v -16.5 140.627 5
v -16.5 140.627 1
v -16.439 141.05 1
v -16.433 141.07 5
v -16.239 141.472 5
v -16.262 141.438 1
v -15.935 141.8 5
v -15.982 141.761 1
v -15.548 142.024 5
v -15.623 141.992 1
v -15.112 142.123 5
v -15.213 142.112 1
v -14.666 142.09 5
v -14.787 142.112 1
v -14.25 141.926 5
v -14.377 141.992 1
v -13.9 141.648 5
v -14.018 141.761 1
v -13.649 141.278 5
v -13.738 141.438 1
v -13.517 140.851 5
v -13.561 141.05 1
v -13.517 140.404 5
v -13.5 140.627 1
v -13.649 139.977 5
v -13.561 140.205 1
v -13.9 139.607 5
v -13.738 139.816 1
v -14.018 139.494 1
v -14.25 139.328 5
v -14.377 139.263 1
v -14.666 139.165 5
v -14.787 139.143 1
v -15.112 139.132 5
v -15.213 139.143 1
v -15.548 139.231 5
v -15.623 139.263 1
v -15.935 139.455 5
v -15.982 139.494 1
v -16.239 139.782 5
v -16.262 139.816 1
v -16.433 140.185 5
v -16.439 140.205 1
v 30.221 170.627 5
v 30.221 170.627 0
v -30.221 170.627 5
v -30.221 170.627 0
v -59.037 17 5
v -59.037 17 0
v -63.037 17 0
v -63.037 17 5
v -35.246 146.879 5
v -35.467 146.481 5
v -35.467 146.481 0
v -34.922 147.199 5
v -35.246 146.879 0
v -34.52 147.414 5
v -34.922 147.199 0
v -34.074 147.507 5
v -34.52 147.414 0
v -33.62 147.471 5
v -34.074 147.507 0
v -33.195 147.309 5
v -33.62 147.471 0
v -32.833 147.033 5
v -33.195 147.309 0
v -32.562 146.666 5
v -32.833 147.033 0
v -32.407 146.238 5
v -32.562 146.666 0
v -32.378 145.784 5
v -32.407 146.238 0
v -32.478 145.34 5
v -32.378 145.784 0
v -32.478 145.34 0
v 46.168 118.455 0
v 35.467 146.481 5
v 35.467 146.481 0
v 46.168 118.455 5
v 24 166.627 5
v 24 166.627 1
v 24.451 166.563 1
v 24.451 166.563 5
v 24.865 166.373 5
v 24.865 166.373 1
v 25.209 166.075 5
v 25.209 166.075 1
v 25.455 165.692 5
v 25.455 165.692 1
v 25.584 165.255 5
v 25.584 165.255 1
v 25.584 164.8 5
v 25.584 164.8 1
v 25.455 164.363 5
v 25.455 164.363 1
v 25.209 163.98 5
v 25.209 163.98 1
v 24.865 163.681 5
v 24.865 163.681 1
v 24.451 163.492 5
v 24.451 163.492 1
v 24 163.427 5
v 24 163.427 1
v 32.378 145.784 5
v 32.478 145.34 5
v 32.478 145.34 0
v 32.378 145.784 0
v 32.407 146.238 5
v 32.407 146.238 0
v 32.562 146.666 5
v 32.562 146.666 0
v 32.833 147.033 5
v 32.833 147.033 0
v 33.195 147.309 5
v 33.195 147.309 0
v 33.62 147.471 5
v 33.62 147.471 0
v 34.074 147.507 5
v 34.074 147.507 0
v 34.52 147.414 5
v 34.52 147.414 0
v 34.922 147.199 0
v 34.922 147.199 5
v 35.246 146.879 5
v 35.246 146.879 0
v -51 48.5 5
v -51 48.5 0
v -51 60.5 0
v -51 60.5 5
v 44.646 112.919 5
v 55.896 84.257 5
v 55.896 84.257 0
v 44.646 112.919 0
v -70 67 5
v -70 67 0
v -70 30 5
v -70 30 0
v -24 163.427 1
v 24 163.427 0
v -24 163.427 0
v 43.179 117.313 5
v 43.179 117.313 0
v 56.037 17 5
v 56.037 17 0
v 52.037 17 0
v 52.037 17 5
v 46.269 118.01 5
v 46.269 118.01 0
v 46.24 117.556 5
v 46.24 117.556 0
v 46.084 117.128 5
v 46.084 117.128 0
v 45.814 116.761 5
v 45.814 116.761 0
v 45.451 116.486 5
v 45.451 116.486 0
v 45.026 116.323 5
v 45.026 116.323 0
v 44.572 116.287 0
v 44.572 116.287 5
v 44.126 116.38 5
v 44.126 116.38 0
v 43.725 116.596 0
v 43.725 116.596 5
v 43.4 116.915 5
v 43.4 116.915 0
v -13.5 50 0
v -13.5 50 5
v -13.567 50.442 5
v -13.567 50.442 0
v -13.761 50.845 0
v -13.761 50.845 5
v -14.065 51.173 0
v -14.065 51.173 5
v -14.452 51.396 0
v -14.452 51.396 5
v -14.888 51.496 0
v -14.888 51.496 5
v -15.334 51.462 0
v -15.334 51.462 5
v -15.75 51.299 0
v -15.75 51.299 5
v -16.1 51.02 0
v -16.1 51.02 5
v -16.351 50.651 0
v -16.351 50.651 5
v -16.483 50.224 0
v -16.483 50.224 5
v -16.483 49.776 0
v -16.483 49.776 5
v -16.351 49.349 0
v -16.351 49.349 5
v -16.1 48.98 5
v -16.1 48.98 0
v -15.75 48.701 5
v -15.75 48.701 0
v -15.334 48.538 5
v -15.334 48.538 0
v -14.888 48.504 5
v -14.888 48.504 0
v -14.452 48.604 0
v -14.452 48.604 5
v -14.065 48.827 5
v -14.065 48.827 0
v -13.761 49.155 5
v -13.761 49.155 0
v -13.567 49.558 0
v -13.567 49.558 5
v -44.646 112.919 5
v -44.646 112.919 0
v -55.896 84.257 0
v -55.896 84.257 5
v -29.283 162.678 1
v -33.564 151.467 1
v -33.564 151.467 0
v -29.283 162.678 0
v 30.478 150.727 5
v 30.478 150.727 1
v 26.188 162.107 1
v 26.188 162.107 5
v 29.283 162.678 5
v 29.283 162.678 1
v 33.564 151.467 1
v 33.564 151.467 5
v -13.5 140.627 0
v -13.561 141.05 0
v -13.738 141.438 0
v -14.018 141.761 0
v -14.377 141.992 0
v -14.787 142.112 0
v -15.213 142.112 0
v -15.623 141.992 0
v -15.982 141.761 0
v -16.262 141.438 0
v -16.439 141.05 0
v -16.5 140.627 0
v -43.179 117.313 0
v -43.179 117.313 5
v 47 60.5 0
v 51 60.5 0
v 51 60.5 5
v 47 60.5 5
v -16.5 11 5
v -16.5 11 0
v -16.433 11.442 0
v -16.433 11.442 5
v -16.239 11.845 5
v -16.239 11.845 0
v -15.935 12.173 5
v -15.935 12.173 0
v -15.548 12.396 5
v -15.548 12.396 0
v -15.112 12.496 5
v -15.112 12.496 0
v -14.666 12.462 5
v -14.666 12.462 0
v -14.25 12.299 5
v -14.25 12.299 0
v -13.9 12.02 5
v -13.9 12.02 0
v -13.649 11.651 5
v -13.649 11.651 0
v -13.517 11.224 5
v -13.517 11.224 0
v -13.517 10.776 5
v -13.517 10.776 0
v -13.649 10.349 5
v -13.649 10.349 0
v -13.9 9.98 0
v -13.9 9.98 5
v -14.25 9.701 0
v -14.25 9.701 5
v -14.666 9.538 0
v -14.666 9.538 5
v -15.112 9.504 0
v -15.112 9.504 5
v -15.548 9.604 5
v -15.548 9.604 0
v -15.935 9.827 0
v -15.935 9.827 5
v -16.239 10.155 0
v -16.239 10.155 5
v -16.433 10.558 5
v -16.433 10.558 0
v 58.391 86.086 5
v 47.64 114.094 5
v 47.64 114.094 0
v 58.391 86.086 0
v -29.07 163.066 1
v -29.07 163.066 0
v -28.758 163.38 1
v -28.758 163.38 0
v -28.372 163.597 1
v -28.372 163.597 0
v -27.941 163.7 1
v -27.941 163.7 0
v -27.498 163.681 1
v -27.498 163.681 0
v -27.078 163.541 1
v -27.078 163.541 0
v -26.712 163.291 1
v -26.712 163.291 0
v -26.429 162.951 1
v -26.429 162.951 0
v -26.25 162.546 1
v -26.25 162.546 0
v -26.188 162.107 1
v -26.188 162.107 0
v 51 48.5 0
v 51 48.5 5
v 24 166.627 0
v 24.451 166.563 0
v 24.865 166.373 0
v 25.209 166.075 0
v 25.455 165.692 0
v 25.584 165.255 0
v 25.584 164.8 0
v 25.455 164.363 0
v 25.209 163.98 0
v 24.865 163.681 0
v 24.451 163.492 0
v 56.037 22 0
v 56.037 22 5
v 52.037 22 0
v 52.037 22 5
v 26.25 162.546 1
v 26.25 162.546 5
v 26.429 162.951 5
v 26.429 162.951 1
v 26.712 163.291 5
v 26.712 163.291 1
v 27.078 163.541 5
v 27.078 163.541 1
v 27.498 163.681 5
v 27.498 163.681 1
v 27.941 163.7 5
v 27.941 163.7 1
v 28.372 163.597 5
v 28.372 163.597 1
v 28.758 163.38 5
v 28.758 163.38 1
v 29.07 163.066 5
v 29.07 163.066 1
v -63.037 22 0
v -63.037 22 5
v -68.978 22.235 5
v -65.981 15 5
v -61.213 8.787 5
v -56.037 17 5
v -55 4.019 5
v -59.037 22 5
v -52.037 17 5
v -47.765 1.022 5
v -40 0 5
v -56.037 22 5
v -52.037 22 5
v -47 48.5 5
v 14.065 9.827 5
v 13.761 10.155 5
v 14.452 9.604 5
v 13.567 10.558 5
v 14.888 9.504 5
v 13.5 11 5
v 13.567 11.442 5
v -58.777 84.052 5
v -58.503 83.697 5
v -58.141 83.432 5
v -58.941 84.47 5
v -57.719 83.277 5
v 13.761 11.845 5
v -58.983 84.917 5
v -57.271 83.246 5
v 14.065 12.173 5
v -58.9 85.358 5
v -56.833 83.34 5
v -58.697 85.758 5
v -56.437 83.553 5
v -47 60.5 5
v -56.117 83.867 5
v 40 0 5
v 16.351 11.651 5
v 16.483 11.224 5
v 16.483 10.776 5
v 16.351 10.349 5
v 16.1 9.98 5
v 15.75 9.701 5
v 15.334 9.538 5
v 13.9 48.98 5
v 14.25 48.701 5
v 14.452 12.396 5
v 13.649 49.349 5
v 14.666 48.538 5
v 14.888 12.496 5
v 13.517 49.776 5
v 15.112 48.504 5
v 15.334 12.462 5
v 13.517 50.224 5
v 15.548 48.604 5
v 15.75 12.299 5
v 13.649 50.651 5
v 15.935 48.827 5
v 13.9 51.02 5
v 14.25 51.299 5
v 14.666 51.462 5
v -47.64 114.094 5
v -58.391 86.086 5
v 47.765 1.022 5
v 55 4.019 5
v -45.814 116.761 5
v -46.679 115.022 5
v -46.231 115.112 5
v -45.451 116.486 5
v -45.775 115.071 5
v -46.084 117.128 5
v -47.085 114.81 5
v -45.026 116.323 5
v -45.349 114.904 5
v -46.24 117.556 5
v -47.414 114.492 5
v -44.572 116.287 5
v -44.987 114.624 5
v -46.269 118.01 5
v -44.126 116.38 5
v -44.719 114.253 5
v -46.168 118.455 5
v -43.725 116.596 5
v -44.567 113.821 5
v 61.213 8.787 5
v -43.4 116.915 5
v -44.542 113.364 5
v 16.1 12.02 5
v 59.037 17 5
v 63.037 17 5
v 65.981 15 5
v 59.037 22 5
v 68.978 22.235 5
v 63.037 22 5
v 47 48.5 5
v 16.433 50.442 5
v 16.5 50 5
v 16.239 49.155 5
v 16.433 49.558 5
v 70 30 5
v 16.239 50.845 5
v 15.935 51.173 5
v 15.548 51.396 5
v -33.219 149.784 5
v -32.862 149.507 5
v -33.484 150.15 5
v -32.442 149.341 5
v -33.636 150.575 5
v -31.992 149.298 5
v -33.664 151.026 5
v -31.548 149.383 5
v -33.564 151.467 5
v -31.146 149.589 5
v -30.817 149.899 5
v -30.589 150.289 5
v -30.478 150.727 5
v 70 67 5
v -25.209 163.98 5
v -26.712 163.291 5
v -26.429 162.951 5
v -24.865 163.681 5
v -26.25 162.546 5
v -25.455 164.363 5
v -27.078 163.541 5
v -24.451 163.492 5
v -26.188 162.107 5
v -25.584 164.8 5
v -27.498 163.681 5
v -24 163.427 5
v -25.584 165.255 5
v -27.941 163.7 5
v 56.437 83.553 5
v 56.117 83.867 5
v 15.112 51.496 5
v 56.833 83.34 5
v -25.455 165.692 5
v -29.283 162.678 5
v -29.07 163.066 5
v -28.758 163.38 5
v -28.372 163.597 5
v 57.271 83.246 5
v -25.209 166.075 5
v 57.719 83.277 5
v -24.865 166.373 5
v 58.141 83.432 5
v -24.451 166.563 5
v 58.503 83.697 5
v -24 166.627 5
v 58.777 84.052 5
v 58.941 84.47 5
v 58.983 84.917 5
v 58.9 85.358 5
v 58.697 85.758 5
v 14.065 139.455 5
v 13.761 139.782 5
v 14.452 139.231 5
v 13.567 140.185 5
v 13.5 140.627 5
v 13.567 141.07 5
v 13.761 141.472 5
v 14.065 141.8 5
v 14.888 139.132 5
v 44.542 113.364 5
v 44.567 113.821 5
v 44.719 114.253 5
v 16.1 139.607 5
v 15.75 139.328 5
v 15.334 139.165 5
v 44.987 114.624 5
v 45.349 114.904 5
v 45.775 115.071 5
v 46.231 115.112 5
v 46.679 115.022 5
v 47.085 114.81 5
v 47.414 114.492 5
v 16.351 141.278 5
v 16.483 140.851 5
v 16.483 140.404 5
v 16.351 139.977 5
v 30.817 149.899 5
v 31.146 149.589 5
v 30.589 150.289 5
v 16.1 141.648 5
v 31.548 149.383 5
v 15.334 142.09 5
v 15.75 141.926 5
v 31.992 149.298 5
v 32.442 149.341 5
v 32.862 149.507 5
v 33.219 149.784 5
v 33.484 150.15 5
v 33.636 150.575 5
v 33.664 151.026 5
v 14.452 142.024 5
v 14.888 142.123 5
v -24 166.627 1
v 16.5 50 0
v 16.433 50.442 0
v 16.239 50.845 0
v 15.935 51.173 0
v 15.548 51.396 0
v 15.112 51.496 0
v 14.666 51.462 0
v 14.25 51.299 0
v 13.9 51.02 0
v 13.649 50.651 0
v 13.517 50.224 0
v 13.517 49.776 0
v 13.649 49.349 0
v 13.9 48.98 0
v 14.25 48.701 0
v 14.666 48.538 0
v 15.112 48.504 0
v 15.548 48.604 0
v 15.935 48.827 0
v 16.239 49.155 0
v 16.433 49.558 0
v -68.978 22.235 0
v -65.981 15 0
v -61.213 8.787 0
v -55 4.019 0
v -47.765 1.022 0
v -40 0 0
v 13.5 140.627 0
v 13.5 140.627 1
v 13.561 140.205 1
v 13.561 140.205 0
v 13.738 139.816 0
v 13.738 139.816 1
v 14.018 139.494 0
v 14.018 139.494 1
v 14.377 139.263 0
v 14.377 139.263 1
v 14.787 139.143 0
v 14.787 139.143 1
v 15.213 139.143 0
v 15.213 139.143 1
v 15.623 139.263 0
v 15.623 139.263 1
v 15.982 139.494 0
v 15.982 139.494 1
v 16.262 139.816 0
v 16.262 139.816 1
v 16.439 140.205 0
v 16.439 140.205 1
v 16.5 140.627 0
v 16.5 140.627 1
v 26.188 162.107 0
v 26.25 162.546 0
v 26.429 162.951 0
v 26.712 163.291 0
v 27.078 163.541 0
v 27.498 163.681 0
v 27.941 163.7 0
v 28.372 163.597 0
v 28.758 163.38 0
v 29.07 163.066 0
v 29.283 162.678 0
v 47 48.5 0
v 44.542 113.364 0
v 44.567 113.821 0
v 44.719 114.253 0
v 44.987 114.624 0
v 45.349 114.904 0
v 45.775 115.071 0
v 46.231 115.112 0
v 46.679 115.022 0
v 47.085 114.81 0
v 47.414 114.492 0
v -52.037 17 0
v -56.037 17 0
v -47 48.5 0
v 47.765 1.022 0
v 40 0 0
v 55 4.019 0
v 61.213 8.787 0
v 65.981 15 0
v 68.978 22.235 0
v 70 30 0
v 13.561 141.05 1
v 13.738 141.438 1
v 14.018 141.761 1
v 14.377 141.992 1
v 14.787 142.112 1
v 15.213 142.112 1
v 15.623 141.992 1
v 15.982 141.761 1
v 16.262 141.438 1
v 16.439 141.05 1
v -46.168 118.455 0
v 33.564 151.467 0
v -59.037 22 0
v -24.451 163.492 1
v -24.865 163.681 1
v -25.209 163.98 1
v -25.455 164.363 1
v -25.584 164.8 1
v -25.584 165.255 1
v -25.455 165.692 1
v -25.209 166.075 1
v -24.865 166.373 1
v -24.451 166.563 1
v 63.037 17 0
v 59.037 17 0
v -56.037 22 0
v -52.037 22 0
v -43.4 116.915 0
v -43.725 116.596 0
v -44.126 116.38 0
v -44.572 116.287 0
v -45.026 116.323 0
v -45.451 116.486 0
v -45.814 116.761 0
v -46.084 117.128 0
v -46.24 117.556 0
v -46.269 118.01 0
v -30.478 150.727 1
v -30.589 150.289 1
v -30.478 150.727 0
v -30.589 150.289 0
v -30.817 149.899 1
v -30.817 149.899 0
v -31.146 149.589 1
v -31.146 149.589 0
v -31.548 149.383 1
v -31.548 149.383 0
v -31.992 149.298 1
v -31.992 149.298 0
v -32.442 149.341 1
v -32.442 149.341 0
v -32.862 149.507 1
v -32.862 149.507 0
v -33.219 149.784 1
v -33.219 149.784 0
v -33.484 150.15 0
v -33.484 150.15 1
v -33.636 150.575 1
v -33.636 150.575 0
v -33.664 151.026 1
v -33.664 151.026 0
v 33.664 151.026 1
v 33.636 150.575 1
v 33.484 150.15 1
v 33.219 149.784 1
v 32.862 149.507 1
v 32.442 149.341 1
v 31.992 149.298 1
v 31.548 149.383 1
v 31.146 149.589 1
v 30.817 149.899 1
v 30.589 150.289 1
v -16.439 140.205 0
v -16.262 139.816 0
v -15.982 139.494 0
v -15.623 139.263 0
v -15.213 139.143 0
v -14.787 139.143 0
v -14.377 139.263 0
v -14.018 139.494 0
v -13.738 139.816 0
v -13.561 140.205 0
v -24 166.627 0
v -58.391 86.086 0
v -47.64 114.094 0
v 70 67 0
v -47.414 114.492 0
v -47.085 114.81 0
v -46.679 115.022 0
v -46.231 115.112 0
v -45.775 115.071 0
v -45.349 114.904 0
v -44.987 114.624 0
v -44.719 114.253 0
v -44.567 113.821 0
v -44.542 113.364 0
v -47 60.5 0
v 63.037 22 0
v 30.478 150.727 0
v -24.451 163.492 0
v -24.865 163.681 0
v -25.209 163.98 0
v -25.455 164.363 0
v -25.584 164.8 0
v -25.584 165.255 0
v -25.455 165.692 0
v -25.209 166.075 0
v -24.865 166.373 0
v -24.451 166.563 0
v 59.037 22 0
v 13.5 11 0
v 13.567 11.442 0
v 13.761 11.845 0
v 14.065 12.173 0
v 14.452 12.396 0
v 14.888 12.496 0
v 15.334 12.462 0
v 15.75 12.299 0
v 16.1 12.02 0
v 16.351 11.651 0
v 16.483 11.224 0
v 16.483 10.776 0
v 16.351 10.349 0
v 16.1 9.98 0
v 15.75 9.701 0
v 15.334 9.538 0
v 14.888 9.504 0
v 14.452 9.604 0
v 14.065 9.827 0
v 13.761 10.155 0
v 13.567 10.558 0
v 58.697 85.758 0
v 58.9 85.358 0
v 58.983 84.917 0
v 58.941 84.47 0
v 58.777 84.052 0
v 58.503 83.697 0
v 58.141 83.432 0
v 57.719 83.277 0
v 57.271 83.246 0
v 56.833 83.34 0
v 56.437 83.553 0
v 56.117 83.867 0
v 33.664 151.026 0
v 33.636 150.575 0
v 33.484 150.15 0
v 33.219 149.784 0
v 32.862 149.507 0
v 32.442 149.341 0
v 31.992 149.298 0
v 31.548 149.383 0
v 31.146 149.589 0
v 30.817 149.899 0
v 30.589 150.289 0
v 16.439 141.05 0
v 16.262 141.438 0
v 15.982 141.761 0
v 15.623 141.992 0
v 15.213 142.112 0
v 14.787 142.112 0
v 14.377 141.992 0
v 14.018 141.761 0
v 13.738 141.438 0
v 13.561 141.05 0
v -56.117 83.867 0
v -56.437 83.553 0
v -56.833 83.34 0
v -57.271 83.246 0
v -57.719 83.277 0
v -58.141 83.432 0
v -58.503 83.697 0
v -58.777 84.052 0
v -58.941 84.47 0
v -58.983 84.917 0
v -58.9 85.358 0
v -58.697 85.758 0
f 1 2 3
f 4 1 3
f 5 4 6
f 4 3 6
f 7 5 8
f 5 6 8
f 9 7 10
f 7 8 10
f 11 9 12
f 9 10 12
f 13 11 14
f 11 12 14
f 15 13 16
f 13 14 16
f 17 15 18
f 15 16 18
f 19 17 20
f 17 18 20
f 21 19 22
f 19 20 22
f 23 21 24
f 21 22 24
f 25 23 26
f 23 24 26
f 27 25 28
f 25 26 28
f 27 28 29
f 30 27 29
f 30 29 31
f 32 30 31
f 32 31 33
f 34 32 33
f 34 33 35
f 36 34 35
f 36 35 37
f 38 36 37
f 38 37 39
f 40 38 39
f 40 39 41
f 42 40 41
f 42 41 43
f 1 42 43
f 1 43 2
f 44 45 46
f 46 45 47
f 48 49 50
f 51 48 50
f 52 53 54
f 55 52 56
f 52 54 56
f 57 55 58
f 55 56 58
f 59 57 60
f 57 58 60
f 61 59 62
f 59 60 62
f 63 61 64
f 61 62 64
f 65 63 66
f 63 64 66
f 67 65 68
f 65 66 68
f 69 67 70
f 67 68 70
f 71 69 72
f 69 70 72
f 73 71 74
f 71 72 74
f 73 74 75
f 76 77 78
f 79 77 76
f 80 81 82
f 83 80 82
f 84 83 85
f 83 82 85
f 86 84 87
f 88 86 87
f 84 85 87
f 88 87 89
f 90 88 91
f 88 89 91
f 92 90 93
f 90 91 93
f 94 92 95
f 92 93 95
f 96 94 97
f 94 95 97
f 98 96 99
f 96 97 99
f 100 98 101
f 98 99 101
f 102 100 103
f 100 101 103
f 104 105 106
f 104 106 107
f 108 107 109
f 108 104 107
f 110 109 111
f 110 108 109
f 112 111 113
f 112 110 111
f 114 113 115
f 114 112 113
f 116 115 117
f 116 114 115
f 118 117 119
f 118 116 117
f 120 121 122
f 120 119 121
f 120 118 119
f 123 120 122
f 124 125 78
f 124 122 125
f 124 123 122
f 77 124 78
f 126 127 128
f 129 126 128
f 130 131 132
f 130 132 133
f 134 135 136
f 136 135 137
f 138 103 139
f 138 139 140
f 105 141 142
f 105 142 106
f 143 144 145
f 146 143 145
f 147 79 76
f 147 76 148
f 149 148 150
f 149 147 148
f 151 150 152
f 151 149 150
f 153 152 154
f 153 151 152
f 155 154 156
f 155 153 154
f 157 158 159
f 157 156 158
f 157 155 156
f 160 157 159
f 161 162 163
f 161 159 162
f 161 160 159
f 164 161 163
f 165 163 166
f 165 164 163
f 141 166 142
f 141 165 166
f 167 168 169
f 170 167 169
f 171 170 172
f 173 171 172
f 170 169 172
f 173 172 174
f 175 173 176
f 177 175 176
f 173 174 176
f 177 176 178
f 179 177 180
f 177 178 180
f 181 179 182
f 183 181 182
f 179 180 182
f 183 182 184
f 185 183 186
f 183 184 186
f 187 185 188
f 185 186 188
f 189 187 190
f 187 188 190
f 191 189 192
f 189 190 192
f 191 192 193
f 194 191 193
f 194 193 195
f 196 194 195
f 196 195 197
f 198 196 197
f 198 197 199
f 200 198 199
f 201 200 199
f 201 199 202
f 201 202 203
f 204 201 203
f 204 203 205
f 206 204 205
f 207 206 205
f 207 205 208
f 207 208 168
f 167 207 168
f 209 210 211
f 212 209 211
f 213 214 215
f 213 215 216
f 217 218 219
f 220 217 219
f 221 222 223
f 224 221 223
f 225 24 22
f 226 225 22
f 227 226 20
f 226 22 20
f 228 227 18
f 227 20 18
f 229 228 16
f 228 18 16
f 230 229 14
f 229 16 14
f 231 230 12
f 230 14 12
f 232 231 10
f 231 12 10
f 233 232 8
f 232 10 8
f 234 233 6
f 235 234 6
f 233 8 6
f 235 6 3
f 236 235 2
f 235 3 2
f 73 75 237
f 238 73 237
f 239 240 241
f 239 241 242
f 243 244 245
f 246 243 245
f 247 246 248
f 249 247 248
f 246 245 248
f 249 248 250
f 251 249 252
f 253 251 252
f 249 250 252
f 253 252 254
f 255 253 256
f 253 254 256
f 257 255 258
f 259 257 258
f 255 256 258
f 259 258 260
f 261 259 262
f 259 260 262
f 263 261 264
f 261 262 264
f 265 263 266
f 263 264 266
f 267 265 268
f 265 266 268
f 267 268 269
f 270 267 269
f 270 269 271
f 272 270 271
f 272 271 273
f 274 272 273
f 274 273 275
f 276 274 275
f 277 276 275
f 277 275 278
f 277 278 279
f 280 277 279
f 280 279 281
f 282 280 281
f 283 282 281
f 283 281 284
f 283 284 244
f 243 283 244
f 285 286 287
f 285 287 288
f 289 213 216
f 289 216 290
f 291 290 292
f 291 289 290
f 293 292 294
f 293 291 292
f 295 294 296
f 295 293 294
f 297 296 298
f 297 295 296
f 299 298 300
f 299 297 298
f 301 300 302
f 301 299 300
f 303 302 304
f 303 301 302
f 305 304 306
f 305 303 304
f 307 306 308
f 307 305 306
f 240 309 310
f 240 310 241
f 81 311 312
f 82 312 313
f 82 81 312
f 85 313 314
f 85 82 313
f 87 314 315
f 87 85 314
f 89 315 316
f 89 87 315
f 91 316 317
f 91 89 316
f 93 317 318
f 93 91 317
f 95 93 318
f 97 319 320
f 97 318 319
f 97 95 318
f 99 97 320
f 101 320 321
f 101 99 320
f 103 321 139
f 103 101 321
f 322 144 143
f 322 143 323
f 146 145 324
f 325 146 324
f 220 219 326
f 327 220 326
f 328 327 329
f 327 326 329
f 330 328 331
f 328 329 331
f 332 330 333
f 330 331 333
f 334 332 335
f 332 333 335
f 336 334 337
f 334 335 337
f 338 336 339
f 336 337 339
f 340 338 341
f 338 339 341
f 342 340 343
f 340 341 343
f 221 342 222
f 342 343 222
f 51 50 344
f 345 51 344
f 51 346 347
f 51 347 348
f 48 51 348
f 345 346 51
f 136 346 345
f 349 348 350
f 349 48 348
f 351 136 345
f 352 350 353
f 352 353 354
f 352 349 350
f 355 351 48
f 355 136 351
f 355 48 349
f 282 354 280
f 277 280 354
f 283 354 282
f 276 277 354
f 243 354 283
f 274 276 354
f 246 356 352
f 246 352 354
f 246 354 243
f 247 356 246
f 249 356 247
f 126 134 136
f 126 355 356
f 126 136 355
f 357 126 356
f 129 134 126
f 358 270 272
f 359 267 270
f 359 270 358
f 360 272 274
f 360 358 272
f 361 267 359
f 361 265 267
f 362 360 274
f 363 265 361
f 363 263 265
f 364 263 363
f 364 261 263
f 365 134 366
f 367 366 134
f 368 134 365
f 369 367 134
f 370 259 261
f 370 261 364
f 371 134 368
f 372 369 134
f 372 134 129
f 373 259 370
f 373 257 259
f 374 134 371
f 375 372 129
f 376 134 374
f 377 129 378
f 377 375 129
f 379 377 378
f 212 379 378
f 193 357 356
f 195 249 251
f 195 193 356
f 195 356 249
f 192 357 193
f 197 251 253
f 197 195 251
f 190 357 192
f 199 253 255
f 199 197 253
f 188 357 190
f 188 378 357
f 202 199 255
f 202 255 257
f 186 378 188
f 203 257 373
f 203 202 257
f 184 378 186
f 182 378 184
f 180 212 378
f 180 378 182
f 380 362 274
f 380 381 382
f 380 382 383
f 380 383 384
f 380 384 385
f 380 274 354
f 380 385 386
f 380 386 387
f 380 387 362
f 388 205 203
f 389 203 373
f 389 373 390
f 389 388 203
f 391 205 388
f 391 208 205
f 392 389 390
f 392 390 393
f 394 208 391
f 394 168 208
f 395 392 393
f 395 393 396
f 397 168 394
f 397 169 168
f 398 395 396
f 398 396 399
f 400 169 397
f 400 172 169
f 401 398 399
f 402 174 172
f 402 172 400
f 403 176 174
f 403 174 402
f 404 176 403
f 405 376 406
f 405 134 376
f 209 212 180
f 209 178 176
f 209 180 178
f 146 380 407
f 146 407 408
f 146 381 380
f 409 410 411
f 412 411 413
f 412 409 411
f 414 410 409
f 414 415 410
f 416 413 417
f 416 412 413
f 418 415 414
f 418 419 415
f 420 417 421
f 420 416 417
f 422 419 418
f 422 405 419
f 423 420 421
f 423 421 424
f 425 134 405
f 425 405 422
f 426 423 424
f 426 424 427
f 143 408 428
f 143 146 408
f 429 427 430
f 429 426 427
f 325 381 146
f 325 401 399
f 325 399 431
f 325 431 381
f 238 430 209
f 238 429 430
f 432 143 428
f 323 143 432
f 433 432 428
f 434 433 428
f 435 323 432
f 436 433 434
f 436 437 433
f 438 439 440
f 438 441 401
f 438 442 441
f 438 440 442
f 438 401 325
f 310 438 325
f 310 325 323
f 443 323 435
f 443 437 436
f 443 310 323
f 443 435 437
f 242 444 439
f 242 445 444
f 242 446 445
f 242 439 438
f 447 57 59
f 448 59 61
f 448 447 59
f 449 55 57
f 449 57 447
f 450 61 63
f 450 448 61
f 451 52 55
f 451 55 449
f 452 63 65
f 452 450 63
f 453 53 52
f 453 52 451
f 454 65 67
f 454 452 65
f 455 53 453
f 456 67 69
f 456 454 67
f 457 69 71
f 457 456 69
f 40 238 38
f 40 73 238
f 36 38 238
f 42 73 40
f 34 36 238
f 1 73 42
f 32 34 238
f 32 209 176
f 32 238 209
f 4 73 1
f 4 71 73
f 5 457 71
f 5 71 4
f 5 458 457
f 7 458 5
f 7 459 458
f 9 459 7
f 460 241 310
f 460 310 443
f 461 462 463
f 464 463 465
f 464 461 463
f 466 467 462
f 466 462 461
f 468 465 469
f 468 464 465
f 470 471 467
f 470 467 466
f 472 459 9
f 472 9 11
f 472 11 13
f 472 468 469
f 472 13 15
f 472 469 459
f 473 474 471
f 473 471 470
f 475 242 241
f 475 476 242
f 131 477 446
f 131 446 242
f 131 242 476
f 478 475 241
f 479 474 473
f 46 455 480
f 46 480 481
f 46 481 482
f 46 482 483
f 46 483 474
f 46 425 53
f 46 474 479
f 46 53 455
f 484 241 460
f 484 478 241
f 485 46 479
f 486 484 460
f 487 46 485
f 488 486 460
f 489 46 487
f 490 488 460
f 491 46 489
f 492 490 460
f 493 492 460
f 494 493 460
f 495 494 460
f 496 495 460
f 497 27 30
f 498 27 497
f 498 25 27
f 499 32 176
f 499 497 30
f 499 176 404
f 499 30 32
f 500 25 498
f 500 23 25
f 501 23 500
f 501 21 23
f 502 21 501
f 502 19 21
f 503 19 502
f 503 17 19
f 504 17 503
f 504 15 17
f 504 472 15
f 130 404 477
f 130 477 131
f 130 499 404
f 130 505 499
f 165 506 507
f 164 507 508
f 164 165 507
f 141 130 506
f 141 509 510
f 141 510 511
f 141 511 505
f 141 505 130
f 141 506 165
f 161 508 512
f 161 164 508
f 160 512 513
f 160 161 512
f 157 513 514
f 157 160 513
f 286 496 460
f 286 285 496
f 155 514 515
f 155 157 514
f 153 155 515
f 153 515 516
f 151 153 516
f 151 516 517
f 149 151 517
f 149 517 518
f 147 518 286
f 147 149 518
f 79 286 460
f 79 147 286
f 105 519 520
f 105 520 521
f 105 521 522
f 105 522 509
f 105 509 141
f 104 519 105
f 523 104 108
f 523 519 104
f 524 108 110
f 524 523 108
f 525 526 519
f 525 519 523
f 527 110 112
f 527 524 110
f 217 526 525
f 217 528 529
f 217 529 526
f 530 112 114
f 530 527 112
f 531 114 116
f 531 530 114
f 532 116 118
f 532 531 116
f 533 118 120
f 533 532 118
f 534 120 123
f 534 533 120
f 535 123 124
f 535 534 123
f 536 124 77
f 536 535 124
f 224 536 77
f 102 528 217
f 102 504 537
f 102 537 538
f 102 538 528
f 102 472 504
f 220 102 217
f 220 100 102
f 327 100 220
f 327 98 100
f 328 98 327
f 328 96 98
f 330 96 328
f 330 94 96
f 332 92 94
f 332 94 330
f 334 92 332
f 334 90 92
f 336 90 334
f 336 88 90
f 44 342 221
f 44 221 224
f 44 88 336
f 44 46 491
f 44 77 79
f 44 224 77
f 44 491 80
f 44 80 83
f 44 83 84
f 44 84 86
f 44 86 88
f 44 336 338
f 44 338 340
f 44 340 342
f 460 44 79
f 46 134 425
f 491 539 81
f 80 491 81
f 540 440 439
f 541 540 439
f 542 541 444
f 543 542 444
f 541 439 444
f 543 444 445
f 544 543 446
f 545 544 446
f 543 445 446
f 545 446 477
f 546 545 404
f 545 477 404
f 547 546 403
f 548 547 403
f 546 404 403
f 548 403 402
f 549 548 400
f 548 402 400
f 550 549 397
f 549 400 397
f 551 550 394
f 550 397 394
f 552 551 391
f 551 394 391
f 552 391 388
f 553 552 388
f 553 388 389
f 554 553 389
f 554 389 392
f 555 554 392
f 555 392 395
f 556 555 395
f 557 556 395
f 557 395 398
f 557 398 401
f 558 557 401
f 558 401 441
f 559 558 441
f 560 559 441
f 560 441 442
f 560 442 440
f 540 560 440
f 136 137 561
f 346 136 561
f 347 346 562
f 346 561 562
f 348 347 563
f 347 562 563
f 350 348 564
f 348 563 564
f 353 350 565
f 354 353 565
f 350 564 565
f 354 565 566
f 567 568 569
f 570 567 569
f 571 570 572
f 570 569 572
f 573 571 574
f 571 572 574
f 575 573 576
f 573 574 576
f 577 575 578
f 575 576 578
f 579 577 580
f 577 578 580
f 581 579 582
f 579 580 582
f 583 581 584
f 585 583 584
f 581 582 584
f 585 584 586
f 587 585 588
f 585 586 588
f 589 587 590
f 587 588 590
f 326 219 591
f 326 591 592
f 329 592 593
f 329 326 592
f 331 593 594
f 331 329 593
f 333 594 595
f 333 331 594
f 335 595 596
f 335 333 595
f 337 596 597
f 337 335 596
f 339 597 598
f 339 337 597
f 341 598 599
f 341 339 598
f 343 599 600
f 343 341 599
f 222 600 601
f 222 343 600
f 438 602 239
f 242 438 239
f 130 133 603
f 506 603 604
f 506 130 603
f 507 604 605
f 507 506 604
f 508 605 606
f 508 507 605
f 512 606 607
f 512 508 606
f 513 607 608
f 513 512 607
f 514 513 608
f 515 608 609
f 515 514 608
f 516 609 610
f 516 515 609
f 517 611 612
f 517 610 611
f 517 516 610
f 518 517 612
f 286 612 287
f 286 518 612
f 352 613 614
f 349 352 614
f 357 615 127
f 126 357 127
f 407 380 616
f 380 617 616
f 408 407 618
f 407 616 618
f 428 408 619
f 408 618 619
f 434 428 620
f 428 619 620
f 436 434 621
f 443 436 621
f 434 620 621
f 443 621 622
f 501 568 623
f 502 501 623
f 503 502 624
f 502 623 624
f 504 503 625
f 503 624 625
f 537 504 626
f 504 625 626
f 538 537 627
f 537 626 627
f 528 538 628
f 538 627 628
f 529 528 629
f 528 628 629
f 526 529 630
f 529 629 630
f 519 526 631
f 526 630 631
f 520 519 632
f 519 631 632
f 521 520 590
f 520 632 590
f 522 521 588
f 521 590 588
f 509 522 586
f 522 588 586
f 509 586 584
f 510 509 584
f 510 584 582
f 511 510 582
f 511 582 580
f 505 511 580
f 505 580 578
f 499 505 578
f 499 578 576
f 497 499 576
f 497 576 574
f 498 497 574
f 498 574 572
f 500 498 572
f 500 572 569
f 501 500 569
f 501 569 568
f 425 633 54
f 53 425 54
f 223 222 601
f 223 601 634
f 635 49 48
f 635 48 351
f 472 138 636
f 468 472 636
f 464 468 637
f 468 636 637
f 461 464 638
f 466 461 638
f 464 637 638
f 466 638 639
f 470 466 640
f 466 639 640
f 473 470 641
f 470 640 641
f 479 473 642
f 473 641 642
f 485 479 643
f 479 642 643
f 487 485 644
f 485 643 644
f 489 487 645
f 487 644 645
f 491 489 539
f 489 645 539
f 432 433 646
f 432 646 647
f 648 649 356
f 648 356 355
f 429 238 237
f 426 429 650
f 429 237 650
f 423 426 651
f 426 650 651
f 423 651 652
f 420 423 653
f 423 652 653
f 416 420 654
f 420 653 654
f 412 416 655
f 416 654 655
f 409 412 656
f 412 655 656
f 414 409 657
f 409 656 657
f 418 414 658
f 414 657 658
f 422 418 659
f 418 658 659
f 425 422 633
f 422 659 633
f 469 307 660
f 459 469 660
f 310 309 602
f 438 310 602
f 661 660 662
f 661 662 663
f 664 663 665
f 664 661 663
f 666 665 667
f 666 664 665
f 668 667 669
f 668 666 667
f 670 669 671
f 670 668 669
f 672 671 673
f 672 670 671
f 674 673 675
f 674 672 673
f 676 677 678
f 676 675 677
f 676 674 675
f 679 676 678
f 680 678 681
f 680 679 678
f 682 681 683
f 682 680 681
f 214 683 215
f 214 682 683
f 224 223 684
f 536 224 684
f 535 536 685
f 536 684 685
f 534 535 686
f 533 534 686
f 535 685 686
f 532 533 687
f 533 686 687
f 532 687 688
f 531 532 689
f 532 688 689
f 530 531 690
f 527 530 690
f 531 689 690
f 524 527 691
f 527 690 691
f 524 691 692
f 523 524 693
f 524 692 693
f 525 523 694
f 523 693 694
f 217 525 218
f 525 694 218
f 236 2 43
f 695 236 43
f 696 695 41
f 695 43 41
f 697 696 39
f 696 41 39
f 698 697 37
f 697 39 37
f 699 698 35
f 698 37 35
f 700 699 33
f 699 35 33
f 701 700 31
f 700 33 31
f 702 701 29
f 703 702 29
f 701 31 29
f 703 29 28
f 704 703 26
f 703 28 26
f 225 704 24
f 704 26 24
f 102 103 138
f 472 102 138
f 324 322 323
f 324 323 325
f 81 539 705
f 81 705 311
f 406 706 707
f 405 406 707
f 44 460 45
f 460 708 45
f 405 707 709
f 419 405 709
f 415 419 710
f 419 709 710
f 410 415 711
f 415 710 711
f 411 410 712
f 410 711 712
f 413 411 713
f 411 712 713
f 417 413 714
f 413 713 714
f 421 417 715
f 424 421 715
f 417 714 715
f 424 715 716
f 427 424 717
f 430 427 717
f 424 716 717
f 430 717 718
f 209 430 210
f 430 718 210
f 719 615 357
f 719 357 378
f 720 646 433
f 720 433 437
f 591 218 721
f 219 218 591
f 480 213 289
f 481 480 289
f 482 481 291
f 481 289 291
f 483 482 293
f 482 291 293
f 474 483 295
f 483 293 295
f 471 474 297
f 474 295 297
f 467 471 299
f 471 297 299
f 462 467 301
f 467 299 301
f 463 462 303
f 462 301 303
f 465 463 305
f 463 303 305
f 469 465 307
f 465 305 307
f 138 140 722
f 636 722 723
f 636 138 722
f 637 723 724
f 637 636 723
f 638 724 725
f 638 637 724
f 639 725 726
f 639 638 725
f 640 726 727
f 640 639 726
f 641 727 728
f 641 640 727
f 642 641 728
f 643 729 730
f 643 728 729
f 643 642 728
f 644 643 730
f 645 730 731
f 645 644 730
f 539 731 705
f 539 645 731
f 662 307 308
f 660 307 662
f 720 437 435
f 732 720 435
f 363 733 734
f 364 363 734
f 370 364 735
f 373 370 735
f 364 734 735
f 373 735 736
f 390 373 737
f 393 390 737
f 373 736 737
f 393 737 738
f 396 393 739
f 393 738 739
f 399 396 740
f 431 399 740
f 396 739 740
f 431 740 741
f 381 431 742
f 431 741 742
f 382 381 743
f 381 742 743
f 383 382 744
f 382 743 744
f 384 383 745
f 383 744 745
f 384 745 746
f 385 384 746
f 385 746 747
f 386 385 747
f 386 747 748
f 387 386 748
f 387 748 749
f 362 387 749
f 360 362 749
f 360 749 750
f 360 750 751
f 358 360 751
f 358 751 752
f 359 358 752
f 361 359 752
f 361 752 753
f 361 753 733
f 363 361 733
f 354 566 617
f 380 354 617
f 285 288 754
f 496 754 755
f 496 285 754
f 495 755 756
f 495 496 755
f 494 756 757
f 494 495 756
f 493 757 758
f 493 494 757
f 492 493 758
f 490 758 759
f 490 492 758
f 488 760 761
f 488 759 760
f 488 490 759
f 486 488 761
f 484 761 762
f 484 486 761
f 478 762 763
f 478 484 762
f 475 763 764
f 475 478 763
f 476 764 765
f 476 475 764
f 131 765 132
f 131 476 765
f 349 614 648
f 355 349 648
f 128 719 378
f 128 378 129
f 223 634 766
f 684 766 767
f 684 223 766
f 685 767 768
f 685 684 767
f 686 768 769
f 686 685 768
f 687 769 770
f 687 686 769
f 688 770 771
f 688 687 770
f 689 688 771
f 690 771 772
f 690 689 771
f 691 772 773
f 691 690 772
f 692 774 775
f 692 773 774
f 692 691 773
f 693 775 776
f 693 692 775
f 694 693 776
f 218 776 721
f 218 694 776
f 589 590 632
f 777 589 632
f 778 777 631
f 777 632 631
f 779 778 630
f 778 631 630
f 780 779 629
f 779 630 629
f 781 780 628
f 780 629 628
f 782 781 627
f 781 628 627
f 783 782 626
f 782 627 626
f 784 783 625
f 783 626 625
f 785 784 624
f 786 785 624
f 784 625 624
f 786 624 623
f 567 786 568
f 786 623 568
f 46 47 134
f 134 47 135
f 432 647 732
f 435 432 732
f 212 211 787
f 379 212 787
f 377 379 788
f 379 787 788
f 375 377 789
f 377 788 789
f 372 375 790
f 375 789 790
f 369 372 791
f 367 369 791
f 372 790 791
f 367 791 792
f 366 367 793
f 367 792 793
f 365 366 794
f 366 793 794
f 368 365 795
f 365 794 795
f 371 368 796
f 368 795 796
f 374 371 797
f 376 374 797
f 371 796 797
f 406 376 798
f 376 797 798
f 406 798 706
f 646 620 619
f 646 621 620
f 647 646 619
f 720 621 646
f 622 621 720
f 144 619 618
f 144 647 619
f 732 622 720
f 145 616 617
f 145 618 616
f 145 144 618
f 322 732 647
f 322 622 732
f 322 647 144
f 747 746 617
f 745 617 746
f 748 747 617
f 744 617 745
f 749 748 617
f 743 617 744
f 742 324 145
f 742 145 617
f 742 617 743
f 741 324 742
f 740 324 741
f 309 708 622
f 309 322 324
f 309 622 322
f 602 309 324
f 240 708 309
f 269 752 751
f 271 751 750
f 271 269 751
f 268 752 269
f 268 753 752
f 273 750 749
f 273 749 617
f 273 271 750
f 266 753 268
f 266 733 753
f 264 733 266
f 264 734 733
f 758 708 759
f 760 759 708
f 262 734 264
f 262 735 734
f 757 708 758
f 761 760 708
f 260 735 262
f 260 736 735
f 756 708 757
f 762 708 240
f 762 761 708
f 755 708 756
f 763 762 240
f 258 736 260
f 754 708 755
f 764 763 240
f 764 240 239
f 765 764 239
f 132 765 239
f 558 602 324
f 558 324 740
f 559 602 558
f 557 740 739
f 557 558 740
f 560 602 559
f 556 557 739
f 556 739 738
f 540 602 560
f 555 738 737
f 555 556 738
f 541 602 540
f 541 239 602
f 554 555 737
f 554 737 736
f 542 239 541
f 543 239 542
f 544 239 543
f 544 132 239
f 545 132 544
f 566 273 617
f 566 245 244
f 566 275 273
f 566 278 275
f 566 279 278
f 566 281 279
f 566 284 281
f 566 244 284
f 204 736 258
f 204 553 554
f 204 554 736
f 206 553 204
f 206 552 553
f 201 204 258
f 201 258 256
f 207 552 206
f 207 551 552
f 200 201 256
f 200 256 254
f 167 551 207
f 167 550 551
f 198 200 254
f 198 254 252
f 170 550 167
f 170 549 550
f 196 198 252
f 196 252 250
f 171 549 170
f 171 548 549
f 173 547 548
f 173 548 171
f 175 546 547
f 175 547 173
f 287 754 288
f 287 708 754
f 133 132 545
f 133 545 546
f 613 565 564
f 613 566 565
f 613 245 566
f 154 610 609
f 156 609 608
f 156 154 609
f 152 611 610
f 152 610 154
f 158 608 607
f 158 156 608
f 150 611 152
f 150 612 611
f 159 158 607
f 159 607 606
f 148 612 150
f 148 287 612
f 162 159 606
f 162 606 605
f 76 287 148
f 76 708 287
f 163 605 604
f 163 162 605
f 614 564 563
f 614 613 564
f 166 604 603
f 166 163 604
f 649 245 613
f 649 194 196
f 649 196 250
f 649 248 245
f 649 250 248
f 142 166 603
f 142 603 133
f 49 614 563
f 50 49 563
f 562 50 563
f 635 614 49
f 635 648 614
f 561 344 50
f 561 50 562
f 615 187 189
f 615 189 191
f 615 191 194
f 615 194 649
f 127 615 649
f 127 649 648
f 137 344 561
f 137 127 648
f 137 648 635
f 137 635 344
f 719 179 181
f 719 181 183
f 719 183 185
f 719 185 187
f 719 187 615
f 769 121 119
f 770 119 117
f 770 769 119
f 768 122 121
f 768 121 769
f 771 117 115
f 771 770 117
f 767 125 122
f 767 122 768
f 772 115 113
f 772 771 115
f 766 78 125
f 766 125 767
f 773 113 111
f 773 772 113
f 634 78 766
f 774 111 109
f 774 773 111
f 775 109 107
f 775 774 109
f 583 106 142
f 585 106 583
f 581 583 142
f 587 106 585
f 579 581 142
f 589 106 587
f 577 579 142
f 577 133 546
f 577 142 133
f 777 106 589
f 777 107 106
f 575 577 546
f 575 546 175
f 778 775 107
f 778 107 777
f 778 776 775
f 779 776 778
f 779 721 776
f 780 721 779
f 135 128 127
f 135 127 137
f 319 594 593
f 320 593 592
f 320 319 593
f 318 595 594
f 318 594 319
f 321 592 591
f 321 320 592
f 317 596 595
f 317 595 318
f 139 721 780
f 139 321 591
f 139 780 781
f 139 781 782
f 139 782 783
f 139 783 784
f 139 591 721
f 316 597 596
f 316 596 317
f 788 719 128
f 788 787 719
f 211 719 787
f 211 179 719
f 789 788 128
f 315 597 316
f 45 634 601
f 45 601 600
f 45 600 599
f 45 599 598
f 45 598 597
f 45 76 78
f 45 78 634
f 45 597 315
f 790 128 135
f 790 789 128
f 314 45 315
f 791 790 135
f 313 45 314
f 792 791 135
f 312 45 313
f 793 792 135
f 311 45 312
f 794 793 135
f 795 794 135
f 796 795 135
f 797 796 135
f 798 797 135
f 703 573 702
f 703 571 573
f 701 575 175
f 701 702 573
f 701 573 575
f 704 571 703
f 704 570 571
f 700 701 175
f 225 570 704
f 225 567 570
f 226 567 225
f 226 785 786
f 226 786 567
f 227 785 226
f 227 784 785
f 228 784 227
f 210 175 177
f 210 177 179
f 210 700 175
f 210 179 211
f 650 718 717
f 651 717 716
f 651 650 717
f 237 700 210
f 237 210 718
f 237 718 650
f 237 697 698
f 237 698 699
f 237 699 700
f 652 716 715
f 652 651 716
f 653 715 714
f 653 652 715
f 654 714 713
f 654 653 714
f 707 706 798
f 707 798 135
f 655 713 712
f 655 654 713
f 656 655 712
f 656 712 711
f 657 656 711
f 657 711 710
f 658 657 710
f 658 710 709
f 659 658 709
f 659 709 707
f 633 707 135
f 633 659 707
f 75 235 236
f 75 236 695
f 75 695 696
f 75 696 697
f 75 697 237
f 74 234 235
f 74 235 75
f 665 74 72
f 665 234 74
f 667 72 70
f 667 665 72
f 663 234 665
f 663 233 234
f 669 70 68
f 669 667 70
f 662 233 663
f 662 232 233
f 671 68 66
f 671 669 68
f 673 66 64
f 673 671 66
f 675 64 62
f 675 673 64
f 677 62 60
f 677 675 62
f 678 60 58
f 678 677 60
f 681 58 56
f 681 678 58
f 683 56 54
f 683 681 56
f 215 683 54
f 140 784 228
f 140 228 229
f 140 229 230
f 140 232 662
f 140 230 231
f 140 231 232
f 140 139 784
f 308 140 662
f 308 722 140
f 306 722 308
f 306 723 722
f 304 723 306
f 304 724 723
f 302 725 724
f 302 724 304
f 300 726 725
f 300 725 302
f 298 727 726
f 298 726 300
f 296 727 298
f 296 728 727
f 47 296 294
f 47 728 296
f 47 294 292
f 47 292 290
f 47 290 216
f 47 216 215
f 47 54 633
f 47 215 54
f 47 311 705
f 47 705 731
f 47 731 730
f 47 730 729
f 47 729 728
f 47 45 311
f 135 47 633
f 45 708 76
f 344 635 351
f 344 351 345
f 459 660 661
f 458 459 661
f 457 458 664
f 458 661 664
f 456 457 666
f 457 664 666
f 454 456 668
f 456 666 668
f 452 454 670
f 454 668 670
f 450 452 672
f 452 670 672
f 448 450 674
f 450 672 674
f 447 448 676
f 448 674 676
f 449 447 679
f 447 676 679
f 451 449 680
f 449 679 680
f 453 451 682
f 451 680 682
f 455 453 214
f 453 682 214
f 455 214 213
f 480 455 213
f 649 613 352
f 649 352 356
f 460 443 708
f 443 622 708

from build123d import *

# Parameters (mm, degrees)
BOSS_EXTRUDE2_DEPTH  = 1
SKETCH41_W           = 4
SKETCH41_H           = 5
SKETCH41_R           = 1.5
SKETCH41_H_2         = 12
CUT_EXTRUDE42_DEPTH  = 19
BOSS_EXTRUDE17_DEPTH = 4
SKETCH47_W           = 4
SKETCH47_H           = 5
SKETCH47_H_2         = 12
CUT_EXTRUDE47_DEPTH  = 185.495850796
SKETCH48_R           = 1.5
CUT_EXTRUDE44_DEPTH  = 185.495850796
BOSS_EXTRUDE18_START = -1
SKETCH51_R           = 1.5
BOSS_EXTRUDE18_DEPTH = 1
BOSS_EXTRUDE19_START = -2
SKETCH52_R           = 1.5
BOSS_EXTRUDE19_DEPTH = 2
SKETCH53_R           = 1.5
CUT_EXTRUDE46_DEPTH  = 185.495850796
BOSS_EXTRUDE20_START = -1
SKETCH55_R           = 1.5
BOSS_EXTRUDE20_DEPTH = 1
SKETCH58_R           = 1.5
CUT_EXTRUDE45_DEPTH  = 185.495850796


with BuildPart() as part:
    # Sketch2 → Boss-Extrude2 (new body)
    with BuildSketch(Plane.XY):
        with BuildLine():
            Line((0, 0), (40, 0))
            ThreePointArc((40, 0), (61.213203436, 8.786796564), (70, 30))
            Line((70, 30), (70, 67))
            Line((70, 67), (30.2211576, 170.627427341))
            Line((30.2211576, 170.627427341), (-30.2211576, 170.627427341))
            Line((-30.2211576, 170.627427341), (-70, 67))
            Line((-70, 67), (-70, 30))
            ThreePointArc((-70, 30), (-61.213203436, 8.786796564), (-40, 0))
            Line((-40, 0), (0, 0))
        make_face()
    extrude(amount=BOSS_EXTRUDE2_DEPTH)

    # Sketch41 → Cut-Extrude42 (cut)
    with BuildSketch(Plane.XY.offset(1)):
        with Locations((54.037011669, 19.5)):
            Rectangle(SKETCH41_W, SKETCH41_H)
        with Locations((-54.037011669, 19.5)):
            Rectangle(SKETCH41_W, SKETCH41_H)
        with Locations((-15, 65)):
            Circle(SKETCH41_R)
        with Locations((15, 65)):
            Circle(SKETCH41_R)
        with BuildLine():
            ThreePointArc((-55.895620015, 84.257333662), (-58.330916289, 83.551440528), (-58.390755847, 86.086272335))
            Line((-58.390755847, 86.086272335), (-47.63971736, 114.09368513))
            ThreePointArc((-47.63971736, 114.09368513), (-45.555710052, 115.00290606), (-44.646489123, 112.918898752))
            Line((-44.646489123, 112.918898752), (-55.895620015, 84.257333662))
        make_face()
        with BuildLine():
            ThreePointArc((-43.178836535, 117.313137537), (-45.24430647, 116.38910618), (-46.168337826, 118.454576116))
            Line((-46.168337826, 118.454576116), (-35.46735115, 146.481150722))
            ThreePointArc((-35.46735115, 146.481150722), (-33.401881215, 147.405182078), (-32.477849859, 145.339712143))
            Line((-32.477849859, 145.339712143), (-43.178836535, 117.313137537))
        make_face()
        with BuildLine():
            ThreePointArc((24, 166.627427341), (25.6, 165.027427341), (24, 163.427427341))
            Line((24, 163.427427341), (-24, 163.427427341))
            ThreePointArc((-24, 163.427427341), (-25.6, 165.027427341), (-24, 166.627427341))
            Line((-24, 166.627427341), (24, 166.627427341))
        make_face()
        with BuildLine():
            ThreePointArc((33.563613753, 151.467161805), (32.441986519, 149.340557263), (30.477844504, 150.727150454))
            Line((30.477844504, 150.727150454), (26.188468437, 162.107072358))
            ThreePointArc((26.188468437, 162.107072358), (27.498296965, 163.680540031), (29.283219083, 162.677791648))
            Line((29.283219083, 162.677791648), (33.563613753, 151.467161805))
        make_face()
        with BuildLine():
            Line((55.895620015, 84.257333662), (44.646489123, 112.918898752))
            ThreePointArc((44.646489123, 112.918898752), (45.555710052, 115.00290606), (47.63971736, 114.09368513))
            Line((47.63971736, 114.09368513), (58.390755847, 86.086272335))
            ThreePointArc((58.390755847, 86.086272335), (58.330916289, 83.551440528), (55.895620015, 84.257333662))
        make_face()
        with Locations((-15, 140.627427341)):
            Circle(SKETCH41_R)
        with Locations((15, 140.627427341)):
            Circle(SKETCH41_R)
        with Locations((49, 54.5)):
            Rectangle(SKETCH41_W, SKETCH41_H_2)
        with Locations((-49, 54.5)):
            Rectangle(SKETCH41_W, SKETCH41_H_2)
        with Locations((61.037011669, 19.5)):
            Rectangle(SKETCH41_W, SKETCH41_H)
        with Locations(Location((15, 15, 0), (0, 0, 180))):
            Circle(SKETCH41_R)
        with Locations((-15, 15)):
            Circle(SKETCH41_R)
        with Locations((-61.037011669, 19.5)):
            Rectangle(SKETCH41_W, SKETCH41_H)
        with BuildLine():
            Line((-33.563613753, 151.467161805), (-29.283219083, 162.677791648))
            ThreePointArc((-29.283219083, 162.677791648), (-27.498296965, 163.680540031), (-26.188468437, 162.107072358))
            Line((-26.188468437, 162.107072358), (-30.477844504, 150.727150454))
            ThreePointArc((-30.477844504, 150.727150454), (-32.441986519, 149.340557263), (-33.563613753, 151.467161805))
        make_face()
        with BuildLine():
            Line((35.46735115, 146.481150722), (46.168337826, 118.454576116))
            ThreePointArc((46.168337826, 118.454576116), (45.24430647, 116.38910618), (43.178836535, 117.313137537))
            Line((43.178836535, 117.313137537), (32.477849859, 145.339712143))
            ThreePointArc((32.477849859, 145.339712143), (33.401881215, 147.405182078), (35.46735115, 146.481150722))
        make_face()
    extrude(amount=-CUT_EXTRUDE42_DEPTH, mode=Mode.SUBTRACT)

    # Sketch42 → Boss-Extrude17 (add)
    with BuildSketch(Plane.XY.offset(1)):
        with BuildLine():
            Line((-40, 0), (40, 0))
            ThreePointArc((40, 0), (61.213203436, 8.786796564), (70, 30))
            Line((70, 30), (70, 67))
            Line((70, 67), (30.2211576, 170.627427341))
            Line((30.2211576, 170.627427341), (-30.2211576, 170.627427341))
            Line((-30.2211576, 170.627427341), (-70, 67))
            Line((-70, 67), (-70, 30))
            ThreePointArc((-70, 30), (-61.213203436, 8.786796564), (-40, 0))
        make_face()
    extrude(amount=BOSS_EXTRUDE17_DEPTH)

    # Sketch47 → Cut-Extrude47 (cut, through all)
    with BuildSketch(Plane(origin=(0, 0, 0), x_dir=(-1, 0, 0), z_dir=(0, 0, -1))):
        with Locations((61.037011669, 19.5)):
            Rectangle(SKETCH47_W, SKETCH47_H)
        with Locations((54.037011669, 19.5)):
            Rectangle(SKETCH47_W, SKETCH47_H)
        with Locations((-54.037011669, 19.5)):
            Rectangle(SKETCH47_W, SKETCH47_H)
        with Locations((-61.037011669, 19.5)):
            Rectangle(SKETCH47_W, SKETCH47_H)
        with Locations((-49, 54.5)):
            Rectangle(SKETCH47_W, SKETCH47_H_2)
        with Locations((49, 54.5)):
            Rectangle(SKETCH47_W, SKETCH47_H_2)
    extrude(amount=-CUT_EXTRUDE47_DEPTH, mode=Mode.SUBTRACT)

    # Sketch48 → Cut-Extrude44 (cut, through all)
    with BuildSketch(Plane(origin=(0, 0, 0), x_dir=(-1, 0, 0), z_dir=(0, 0, -1))):
        with Locations((-15, 140.627427341)):
            Circle(SKETCH48_R)
        with Locations((15, 140.627427341)):
            Circle(SKETCH48_R)
        with BuildLine():
            Line((-43.178836535, 117.313137537), (-32.477849859, 145.339712143))
            ThreePointArc((-32.477849859, 145.339712143), (-33.401881215, 147.405182078), (-35.46735115, 146.481150722))
            Line((-35.46735115, 146.481150722), (-46.168337826, 118.454576116))
            ThreePointArc((-46.168337826, 118.454576116), (-45.24430647, 116.38910618), (-43.178836535, 117.313137537))
        make_face()
        with BuildLine():
            Line((-55.895620015, 84.257333662), (-44.646489123, 112.918898752))
            ThreePointArc((-44.646489123, 112.918898752), (-45.555710052, 115.00290606), (-47.63971736, 114.09368513))
            Line((-47.63971736, 114.09368513), (-58.390755847, 86.086272335))
            ThreePointArc((-58.390755847, 86.086272335), (-58.330916289, 83.551440528), (-55.895620015, 84.257333662))
        make_face()
        with BuildLine():
            Line((-30.477844504, 150.727150454), (-26.188468437, 162.107072358))
            ThreePointArc((-26.188468437, 162.107072358), (-27.498296965, 163.680540031), (-29.283219083, 162.677791648))
            Line((-29.283219083, 162.677791648), (-33.563613753, 151.467161805))
            ThreePointArc((-33.563613753, 151.467161805), (-32.441986519, 149.340557263), (-30.477844504, 150.727150454))
        make_face()
        with BuildLine():
            Line((-24, 163.427427341), (24, 163.427427341))
            ThreePointArc((24, 163.427427341), (25.6, 165.027427341), (24, 166.627427341))
            Line((24, 166.627427341), (-24, 166.627427341))
            ThreePointArc((-24, 166.627427341), (-25.6, 165.027427341), (-24, 163.427427341))
        make_face()
        with BuildLine():
            Line((26.188468437, 162.107072358), (30.477844504, 150.727150454))
            ThreePointArc((30.477844504, 150.727150454), (32.441986519, 149.340557263), (33.563613753, 151.467161805))
            Line((33.563613753, 151.467161805), (29.283219083, 162.677791648))
            ThreePointArc((29.283219083, 162.677791648), (27.498296965, 163.680540031), (26.188468437, 162.107072358))
        make_face()
        with BuildLine():
            Line((46.168337826, 118.454576116), (35.46735115, 146.481150722))
            ThreePointArc((35.46735115, 146.481150722), (33.401881215, 147.405182078), (32.477849859, 145.339712143))
            Line((32.477849859, 145.339712143), (43.178836535, 117.313137537))
            ThreePointArc((43.178836535, 117.313137537), (45.24430647, 116.38910618), (46.168337826, 118.454576116))
        make_face()
        with BuildLine():
            Line((58.390755847, 86.086272335), (47.63971736, 114.09368513))
            ThreePointArc((47.63971736, 114.09368513), (45.555710052, 115.00290606), (44.646489123, 112.918898752))
            Line((44.646489123, 112.918898752), (55.895620015, 84.257333662))
            ThreePointArc((55.895620015, 84.257333662), (58.330916289, 83.551440528), (58.390755847, 86.086272335))
        make_face()
    extrude(amount=-CUT_EXTRUDE44_DEPTH, mode=Mode.SUBTRACT)

    # Sketch51 → Boss-Extrude18 (add)
    with BuildSketch(Plane(origin=(0, 0, 0), x_dir=(-1, 0, 0), z_dir=(0, 0, -1)).offset(BOSS_EXTRUDE18_START)):
        with Locations((-15, 65)):
            Circle(SKETCH51_R)
    extrude(amount=BOSS_EXTRUDE18_DEPTH)

    # Sketch52 → Boss-Extrude19 (add)
    with BuildSketch(Plane(origin=(0, 0, 0), x_dir=(-1, 0, 0), z_dir=(0, 0, -1)).offset(BOSS_EXTRUDE19_START)):
        with Locations((15, 65)):
            Circle(SKETCH52_R)
    extrude(amount=BOSS_EXTRUDE19_DEPTH)

    # Sketch53 → Cut-Extrude46 (cut, through all)
    with BuildSketch(Plane.XY.offset(5)):
        with Locations((-15, 50)):
            Circle(SKETCH53_R)
        with Locations((15, 50)):
            Circle(SKETCH53_R)
    extrude(amount=-CUT_EXTRUDE46_DEPTH, mode=Mode.SUBTRACT)

    # Sketch55 → Boss-Extrude20 (add)
    with BuildSketch(Plane(origin=(0, 0, 0), x_dir=(-1, 0, 0), z_dir=(0, 0, -1)).offset(BOSS_EXTRUDE20_START)):
        with Locations((-15, 15)):
            Circle(SKETCH55_R)
        with Locations((15, 15)):
            Circle(SKETCH55_R)
    extrude(amount=BOSS_EXTRUDE20_DEPTH)

    # Sketch58 → Cut-Extrude45 (cut, through all)
    with BuildSketch(Plane(origin=(0, 0, 0), x_dir=(-1, 0, 0), z_dir=(0, 0, -1))):
        with Locations((-15, 11)):
            Circle(SKETCH58_R)
        with Locations((15, 11)):
            Circle(SKETCH58_R)
    extrude(amount=-CUT_EXTRUDE45_DEPTH, mode=Mode.SUBTRACT)


solid = part.part
